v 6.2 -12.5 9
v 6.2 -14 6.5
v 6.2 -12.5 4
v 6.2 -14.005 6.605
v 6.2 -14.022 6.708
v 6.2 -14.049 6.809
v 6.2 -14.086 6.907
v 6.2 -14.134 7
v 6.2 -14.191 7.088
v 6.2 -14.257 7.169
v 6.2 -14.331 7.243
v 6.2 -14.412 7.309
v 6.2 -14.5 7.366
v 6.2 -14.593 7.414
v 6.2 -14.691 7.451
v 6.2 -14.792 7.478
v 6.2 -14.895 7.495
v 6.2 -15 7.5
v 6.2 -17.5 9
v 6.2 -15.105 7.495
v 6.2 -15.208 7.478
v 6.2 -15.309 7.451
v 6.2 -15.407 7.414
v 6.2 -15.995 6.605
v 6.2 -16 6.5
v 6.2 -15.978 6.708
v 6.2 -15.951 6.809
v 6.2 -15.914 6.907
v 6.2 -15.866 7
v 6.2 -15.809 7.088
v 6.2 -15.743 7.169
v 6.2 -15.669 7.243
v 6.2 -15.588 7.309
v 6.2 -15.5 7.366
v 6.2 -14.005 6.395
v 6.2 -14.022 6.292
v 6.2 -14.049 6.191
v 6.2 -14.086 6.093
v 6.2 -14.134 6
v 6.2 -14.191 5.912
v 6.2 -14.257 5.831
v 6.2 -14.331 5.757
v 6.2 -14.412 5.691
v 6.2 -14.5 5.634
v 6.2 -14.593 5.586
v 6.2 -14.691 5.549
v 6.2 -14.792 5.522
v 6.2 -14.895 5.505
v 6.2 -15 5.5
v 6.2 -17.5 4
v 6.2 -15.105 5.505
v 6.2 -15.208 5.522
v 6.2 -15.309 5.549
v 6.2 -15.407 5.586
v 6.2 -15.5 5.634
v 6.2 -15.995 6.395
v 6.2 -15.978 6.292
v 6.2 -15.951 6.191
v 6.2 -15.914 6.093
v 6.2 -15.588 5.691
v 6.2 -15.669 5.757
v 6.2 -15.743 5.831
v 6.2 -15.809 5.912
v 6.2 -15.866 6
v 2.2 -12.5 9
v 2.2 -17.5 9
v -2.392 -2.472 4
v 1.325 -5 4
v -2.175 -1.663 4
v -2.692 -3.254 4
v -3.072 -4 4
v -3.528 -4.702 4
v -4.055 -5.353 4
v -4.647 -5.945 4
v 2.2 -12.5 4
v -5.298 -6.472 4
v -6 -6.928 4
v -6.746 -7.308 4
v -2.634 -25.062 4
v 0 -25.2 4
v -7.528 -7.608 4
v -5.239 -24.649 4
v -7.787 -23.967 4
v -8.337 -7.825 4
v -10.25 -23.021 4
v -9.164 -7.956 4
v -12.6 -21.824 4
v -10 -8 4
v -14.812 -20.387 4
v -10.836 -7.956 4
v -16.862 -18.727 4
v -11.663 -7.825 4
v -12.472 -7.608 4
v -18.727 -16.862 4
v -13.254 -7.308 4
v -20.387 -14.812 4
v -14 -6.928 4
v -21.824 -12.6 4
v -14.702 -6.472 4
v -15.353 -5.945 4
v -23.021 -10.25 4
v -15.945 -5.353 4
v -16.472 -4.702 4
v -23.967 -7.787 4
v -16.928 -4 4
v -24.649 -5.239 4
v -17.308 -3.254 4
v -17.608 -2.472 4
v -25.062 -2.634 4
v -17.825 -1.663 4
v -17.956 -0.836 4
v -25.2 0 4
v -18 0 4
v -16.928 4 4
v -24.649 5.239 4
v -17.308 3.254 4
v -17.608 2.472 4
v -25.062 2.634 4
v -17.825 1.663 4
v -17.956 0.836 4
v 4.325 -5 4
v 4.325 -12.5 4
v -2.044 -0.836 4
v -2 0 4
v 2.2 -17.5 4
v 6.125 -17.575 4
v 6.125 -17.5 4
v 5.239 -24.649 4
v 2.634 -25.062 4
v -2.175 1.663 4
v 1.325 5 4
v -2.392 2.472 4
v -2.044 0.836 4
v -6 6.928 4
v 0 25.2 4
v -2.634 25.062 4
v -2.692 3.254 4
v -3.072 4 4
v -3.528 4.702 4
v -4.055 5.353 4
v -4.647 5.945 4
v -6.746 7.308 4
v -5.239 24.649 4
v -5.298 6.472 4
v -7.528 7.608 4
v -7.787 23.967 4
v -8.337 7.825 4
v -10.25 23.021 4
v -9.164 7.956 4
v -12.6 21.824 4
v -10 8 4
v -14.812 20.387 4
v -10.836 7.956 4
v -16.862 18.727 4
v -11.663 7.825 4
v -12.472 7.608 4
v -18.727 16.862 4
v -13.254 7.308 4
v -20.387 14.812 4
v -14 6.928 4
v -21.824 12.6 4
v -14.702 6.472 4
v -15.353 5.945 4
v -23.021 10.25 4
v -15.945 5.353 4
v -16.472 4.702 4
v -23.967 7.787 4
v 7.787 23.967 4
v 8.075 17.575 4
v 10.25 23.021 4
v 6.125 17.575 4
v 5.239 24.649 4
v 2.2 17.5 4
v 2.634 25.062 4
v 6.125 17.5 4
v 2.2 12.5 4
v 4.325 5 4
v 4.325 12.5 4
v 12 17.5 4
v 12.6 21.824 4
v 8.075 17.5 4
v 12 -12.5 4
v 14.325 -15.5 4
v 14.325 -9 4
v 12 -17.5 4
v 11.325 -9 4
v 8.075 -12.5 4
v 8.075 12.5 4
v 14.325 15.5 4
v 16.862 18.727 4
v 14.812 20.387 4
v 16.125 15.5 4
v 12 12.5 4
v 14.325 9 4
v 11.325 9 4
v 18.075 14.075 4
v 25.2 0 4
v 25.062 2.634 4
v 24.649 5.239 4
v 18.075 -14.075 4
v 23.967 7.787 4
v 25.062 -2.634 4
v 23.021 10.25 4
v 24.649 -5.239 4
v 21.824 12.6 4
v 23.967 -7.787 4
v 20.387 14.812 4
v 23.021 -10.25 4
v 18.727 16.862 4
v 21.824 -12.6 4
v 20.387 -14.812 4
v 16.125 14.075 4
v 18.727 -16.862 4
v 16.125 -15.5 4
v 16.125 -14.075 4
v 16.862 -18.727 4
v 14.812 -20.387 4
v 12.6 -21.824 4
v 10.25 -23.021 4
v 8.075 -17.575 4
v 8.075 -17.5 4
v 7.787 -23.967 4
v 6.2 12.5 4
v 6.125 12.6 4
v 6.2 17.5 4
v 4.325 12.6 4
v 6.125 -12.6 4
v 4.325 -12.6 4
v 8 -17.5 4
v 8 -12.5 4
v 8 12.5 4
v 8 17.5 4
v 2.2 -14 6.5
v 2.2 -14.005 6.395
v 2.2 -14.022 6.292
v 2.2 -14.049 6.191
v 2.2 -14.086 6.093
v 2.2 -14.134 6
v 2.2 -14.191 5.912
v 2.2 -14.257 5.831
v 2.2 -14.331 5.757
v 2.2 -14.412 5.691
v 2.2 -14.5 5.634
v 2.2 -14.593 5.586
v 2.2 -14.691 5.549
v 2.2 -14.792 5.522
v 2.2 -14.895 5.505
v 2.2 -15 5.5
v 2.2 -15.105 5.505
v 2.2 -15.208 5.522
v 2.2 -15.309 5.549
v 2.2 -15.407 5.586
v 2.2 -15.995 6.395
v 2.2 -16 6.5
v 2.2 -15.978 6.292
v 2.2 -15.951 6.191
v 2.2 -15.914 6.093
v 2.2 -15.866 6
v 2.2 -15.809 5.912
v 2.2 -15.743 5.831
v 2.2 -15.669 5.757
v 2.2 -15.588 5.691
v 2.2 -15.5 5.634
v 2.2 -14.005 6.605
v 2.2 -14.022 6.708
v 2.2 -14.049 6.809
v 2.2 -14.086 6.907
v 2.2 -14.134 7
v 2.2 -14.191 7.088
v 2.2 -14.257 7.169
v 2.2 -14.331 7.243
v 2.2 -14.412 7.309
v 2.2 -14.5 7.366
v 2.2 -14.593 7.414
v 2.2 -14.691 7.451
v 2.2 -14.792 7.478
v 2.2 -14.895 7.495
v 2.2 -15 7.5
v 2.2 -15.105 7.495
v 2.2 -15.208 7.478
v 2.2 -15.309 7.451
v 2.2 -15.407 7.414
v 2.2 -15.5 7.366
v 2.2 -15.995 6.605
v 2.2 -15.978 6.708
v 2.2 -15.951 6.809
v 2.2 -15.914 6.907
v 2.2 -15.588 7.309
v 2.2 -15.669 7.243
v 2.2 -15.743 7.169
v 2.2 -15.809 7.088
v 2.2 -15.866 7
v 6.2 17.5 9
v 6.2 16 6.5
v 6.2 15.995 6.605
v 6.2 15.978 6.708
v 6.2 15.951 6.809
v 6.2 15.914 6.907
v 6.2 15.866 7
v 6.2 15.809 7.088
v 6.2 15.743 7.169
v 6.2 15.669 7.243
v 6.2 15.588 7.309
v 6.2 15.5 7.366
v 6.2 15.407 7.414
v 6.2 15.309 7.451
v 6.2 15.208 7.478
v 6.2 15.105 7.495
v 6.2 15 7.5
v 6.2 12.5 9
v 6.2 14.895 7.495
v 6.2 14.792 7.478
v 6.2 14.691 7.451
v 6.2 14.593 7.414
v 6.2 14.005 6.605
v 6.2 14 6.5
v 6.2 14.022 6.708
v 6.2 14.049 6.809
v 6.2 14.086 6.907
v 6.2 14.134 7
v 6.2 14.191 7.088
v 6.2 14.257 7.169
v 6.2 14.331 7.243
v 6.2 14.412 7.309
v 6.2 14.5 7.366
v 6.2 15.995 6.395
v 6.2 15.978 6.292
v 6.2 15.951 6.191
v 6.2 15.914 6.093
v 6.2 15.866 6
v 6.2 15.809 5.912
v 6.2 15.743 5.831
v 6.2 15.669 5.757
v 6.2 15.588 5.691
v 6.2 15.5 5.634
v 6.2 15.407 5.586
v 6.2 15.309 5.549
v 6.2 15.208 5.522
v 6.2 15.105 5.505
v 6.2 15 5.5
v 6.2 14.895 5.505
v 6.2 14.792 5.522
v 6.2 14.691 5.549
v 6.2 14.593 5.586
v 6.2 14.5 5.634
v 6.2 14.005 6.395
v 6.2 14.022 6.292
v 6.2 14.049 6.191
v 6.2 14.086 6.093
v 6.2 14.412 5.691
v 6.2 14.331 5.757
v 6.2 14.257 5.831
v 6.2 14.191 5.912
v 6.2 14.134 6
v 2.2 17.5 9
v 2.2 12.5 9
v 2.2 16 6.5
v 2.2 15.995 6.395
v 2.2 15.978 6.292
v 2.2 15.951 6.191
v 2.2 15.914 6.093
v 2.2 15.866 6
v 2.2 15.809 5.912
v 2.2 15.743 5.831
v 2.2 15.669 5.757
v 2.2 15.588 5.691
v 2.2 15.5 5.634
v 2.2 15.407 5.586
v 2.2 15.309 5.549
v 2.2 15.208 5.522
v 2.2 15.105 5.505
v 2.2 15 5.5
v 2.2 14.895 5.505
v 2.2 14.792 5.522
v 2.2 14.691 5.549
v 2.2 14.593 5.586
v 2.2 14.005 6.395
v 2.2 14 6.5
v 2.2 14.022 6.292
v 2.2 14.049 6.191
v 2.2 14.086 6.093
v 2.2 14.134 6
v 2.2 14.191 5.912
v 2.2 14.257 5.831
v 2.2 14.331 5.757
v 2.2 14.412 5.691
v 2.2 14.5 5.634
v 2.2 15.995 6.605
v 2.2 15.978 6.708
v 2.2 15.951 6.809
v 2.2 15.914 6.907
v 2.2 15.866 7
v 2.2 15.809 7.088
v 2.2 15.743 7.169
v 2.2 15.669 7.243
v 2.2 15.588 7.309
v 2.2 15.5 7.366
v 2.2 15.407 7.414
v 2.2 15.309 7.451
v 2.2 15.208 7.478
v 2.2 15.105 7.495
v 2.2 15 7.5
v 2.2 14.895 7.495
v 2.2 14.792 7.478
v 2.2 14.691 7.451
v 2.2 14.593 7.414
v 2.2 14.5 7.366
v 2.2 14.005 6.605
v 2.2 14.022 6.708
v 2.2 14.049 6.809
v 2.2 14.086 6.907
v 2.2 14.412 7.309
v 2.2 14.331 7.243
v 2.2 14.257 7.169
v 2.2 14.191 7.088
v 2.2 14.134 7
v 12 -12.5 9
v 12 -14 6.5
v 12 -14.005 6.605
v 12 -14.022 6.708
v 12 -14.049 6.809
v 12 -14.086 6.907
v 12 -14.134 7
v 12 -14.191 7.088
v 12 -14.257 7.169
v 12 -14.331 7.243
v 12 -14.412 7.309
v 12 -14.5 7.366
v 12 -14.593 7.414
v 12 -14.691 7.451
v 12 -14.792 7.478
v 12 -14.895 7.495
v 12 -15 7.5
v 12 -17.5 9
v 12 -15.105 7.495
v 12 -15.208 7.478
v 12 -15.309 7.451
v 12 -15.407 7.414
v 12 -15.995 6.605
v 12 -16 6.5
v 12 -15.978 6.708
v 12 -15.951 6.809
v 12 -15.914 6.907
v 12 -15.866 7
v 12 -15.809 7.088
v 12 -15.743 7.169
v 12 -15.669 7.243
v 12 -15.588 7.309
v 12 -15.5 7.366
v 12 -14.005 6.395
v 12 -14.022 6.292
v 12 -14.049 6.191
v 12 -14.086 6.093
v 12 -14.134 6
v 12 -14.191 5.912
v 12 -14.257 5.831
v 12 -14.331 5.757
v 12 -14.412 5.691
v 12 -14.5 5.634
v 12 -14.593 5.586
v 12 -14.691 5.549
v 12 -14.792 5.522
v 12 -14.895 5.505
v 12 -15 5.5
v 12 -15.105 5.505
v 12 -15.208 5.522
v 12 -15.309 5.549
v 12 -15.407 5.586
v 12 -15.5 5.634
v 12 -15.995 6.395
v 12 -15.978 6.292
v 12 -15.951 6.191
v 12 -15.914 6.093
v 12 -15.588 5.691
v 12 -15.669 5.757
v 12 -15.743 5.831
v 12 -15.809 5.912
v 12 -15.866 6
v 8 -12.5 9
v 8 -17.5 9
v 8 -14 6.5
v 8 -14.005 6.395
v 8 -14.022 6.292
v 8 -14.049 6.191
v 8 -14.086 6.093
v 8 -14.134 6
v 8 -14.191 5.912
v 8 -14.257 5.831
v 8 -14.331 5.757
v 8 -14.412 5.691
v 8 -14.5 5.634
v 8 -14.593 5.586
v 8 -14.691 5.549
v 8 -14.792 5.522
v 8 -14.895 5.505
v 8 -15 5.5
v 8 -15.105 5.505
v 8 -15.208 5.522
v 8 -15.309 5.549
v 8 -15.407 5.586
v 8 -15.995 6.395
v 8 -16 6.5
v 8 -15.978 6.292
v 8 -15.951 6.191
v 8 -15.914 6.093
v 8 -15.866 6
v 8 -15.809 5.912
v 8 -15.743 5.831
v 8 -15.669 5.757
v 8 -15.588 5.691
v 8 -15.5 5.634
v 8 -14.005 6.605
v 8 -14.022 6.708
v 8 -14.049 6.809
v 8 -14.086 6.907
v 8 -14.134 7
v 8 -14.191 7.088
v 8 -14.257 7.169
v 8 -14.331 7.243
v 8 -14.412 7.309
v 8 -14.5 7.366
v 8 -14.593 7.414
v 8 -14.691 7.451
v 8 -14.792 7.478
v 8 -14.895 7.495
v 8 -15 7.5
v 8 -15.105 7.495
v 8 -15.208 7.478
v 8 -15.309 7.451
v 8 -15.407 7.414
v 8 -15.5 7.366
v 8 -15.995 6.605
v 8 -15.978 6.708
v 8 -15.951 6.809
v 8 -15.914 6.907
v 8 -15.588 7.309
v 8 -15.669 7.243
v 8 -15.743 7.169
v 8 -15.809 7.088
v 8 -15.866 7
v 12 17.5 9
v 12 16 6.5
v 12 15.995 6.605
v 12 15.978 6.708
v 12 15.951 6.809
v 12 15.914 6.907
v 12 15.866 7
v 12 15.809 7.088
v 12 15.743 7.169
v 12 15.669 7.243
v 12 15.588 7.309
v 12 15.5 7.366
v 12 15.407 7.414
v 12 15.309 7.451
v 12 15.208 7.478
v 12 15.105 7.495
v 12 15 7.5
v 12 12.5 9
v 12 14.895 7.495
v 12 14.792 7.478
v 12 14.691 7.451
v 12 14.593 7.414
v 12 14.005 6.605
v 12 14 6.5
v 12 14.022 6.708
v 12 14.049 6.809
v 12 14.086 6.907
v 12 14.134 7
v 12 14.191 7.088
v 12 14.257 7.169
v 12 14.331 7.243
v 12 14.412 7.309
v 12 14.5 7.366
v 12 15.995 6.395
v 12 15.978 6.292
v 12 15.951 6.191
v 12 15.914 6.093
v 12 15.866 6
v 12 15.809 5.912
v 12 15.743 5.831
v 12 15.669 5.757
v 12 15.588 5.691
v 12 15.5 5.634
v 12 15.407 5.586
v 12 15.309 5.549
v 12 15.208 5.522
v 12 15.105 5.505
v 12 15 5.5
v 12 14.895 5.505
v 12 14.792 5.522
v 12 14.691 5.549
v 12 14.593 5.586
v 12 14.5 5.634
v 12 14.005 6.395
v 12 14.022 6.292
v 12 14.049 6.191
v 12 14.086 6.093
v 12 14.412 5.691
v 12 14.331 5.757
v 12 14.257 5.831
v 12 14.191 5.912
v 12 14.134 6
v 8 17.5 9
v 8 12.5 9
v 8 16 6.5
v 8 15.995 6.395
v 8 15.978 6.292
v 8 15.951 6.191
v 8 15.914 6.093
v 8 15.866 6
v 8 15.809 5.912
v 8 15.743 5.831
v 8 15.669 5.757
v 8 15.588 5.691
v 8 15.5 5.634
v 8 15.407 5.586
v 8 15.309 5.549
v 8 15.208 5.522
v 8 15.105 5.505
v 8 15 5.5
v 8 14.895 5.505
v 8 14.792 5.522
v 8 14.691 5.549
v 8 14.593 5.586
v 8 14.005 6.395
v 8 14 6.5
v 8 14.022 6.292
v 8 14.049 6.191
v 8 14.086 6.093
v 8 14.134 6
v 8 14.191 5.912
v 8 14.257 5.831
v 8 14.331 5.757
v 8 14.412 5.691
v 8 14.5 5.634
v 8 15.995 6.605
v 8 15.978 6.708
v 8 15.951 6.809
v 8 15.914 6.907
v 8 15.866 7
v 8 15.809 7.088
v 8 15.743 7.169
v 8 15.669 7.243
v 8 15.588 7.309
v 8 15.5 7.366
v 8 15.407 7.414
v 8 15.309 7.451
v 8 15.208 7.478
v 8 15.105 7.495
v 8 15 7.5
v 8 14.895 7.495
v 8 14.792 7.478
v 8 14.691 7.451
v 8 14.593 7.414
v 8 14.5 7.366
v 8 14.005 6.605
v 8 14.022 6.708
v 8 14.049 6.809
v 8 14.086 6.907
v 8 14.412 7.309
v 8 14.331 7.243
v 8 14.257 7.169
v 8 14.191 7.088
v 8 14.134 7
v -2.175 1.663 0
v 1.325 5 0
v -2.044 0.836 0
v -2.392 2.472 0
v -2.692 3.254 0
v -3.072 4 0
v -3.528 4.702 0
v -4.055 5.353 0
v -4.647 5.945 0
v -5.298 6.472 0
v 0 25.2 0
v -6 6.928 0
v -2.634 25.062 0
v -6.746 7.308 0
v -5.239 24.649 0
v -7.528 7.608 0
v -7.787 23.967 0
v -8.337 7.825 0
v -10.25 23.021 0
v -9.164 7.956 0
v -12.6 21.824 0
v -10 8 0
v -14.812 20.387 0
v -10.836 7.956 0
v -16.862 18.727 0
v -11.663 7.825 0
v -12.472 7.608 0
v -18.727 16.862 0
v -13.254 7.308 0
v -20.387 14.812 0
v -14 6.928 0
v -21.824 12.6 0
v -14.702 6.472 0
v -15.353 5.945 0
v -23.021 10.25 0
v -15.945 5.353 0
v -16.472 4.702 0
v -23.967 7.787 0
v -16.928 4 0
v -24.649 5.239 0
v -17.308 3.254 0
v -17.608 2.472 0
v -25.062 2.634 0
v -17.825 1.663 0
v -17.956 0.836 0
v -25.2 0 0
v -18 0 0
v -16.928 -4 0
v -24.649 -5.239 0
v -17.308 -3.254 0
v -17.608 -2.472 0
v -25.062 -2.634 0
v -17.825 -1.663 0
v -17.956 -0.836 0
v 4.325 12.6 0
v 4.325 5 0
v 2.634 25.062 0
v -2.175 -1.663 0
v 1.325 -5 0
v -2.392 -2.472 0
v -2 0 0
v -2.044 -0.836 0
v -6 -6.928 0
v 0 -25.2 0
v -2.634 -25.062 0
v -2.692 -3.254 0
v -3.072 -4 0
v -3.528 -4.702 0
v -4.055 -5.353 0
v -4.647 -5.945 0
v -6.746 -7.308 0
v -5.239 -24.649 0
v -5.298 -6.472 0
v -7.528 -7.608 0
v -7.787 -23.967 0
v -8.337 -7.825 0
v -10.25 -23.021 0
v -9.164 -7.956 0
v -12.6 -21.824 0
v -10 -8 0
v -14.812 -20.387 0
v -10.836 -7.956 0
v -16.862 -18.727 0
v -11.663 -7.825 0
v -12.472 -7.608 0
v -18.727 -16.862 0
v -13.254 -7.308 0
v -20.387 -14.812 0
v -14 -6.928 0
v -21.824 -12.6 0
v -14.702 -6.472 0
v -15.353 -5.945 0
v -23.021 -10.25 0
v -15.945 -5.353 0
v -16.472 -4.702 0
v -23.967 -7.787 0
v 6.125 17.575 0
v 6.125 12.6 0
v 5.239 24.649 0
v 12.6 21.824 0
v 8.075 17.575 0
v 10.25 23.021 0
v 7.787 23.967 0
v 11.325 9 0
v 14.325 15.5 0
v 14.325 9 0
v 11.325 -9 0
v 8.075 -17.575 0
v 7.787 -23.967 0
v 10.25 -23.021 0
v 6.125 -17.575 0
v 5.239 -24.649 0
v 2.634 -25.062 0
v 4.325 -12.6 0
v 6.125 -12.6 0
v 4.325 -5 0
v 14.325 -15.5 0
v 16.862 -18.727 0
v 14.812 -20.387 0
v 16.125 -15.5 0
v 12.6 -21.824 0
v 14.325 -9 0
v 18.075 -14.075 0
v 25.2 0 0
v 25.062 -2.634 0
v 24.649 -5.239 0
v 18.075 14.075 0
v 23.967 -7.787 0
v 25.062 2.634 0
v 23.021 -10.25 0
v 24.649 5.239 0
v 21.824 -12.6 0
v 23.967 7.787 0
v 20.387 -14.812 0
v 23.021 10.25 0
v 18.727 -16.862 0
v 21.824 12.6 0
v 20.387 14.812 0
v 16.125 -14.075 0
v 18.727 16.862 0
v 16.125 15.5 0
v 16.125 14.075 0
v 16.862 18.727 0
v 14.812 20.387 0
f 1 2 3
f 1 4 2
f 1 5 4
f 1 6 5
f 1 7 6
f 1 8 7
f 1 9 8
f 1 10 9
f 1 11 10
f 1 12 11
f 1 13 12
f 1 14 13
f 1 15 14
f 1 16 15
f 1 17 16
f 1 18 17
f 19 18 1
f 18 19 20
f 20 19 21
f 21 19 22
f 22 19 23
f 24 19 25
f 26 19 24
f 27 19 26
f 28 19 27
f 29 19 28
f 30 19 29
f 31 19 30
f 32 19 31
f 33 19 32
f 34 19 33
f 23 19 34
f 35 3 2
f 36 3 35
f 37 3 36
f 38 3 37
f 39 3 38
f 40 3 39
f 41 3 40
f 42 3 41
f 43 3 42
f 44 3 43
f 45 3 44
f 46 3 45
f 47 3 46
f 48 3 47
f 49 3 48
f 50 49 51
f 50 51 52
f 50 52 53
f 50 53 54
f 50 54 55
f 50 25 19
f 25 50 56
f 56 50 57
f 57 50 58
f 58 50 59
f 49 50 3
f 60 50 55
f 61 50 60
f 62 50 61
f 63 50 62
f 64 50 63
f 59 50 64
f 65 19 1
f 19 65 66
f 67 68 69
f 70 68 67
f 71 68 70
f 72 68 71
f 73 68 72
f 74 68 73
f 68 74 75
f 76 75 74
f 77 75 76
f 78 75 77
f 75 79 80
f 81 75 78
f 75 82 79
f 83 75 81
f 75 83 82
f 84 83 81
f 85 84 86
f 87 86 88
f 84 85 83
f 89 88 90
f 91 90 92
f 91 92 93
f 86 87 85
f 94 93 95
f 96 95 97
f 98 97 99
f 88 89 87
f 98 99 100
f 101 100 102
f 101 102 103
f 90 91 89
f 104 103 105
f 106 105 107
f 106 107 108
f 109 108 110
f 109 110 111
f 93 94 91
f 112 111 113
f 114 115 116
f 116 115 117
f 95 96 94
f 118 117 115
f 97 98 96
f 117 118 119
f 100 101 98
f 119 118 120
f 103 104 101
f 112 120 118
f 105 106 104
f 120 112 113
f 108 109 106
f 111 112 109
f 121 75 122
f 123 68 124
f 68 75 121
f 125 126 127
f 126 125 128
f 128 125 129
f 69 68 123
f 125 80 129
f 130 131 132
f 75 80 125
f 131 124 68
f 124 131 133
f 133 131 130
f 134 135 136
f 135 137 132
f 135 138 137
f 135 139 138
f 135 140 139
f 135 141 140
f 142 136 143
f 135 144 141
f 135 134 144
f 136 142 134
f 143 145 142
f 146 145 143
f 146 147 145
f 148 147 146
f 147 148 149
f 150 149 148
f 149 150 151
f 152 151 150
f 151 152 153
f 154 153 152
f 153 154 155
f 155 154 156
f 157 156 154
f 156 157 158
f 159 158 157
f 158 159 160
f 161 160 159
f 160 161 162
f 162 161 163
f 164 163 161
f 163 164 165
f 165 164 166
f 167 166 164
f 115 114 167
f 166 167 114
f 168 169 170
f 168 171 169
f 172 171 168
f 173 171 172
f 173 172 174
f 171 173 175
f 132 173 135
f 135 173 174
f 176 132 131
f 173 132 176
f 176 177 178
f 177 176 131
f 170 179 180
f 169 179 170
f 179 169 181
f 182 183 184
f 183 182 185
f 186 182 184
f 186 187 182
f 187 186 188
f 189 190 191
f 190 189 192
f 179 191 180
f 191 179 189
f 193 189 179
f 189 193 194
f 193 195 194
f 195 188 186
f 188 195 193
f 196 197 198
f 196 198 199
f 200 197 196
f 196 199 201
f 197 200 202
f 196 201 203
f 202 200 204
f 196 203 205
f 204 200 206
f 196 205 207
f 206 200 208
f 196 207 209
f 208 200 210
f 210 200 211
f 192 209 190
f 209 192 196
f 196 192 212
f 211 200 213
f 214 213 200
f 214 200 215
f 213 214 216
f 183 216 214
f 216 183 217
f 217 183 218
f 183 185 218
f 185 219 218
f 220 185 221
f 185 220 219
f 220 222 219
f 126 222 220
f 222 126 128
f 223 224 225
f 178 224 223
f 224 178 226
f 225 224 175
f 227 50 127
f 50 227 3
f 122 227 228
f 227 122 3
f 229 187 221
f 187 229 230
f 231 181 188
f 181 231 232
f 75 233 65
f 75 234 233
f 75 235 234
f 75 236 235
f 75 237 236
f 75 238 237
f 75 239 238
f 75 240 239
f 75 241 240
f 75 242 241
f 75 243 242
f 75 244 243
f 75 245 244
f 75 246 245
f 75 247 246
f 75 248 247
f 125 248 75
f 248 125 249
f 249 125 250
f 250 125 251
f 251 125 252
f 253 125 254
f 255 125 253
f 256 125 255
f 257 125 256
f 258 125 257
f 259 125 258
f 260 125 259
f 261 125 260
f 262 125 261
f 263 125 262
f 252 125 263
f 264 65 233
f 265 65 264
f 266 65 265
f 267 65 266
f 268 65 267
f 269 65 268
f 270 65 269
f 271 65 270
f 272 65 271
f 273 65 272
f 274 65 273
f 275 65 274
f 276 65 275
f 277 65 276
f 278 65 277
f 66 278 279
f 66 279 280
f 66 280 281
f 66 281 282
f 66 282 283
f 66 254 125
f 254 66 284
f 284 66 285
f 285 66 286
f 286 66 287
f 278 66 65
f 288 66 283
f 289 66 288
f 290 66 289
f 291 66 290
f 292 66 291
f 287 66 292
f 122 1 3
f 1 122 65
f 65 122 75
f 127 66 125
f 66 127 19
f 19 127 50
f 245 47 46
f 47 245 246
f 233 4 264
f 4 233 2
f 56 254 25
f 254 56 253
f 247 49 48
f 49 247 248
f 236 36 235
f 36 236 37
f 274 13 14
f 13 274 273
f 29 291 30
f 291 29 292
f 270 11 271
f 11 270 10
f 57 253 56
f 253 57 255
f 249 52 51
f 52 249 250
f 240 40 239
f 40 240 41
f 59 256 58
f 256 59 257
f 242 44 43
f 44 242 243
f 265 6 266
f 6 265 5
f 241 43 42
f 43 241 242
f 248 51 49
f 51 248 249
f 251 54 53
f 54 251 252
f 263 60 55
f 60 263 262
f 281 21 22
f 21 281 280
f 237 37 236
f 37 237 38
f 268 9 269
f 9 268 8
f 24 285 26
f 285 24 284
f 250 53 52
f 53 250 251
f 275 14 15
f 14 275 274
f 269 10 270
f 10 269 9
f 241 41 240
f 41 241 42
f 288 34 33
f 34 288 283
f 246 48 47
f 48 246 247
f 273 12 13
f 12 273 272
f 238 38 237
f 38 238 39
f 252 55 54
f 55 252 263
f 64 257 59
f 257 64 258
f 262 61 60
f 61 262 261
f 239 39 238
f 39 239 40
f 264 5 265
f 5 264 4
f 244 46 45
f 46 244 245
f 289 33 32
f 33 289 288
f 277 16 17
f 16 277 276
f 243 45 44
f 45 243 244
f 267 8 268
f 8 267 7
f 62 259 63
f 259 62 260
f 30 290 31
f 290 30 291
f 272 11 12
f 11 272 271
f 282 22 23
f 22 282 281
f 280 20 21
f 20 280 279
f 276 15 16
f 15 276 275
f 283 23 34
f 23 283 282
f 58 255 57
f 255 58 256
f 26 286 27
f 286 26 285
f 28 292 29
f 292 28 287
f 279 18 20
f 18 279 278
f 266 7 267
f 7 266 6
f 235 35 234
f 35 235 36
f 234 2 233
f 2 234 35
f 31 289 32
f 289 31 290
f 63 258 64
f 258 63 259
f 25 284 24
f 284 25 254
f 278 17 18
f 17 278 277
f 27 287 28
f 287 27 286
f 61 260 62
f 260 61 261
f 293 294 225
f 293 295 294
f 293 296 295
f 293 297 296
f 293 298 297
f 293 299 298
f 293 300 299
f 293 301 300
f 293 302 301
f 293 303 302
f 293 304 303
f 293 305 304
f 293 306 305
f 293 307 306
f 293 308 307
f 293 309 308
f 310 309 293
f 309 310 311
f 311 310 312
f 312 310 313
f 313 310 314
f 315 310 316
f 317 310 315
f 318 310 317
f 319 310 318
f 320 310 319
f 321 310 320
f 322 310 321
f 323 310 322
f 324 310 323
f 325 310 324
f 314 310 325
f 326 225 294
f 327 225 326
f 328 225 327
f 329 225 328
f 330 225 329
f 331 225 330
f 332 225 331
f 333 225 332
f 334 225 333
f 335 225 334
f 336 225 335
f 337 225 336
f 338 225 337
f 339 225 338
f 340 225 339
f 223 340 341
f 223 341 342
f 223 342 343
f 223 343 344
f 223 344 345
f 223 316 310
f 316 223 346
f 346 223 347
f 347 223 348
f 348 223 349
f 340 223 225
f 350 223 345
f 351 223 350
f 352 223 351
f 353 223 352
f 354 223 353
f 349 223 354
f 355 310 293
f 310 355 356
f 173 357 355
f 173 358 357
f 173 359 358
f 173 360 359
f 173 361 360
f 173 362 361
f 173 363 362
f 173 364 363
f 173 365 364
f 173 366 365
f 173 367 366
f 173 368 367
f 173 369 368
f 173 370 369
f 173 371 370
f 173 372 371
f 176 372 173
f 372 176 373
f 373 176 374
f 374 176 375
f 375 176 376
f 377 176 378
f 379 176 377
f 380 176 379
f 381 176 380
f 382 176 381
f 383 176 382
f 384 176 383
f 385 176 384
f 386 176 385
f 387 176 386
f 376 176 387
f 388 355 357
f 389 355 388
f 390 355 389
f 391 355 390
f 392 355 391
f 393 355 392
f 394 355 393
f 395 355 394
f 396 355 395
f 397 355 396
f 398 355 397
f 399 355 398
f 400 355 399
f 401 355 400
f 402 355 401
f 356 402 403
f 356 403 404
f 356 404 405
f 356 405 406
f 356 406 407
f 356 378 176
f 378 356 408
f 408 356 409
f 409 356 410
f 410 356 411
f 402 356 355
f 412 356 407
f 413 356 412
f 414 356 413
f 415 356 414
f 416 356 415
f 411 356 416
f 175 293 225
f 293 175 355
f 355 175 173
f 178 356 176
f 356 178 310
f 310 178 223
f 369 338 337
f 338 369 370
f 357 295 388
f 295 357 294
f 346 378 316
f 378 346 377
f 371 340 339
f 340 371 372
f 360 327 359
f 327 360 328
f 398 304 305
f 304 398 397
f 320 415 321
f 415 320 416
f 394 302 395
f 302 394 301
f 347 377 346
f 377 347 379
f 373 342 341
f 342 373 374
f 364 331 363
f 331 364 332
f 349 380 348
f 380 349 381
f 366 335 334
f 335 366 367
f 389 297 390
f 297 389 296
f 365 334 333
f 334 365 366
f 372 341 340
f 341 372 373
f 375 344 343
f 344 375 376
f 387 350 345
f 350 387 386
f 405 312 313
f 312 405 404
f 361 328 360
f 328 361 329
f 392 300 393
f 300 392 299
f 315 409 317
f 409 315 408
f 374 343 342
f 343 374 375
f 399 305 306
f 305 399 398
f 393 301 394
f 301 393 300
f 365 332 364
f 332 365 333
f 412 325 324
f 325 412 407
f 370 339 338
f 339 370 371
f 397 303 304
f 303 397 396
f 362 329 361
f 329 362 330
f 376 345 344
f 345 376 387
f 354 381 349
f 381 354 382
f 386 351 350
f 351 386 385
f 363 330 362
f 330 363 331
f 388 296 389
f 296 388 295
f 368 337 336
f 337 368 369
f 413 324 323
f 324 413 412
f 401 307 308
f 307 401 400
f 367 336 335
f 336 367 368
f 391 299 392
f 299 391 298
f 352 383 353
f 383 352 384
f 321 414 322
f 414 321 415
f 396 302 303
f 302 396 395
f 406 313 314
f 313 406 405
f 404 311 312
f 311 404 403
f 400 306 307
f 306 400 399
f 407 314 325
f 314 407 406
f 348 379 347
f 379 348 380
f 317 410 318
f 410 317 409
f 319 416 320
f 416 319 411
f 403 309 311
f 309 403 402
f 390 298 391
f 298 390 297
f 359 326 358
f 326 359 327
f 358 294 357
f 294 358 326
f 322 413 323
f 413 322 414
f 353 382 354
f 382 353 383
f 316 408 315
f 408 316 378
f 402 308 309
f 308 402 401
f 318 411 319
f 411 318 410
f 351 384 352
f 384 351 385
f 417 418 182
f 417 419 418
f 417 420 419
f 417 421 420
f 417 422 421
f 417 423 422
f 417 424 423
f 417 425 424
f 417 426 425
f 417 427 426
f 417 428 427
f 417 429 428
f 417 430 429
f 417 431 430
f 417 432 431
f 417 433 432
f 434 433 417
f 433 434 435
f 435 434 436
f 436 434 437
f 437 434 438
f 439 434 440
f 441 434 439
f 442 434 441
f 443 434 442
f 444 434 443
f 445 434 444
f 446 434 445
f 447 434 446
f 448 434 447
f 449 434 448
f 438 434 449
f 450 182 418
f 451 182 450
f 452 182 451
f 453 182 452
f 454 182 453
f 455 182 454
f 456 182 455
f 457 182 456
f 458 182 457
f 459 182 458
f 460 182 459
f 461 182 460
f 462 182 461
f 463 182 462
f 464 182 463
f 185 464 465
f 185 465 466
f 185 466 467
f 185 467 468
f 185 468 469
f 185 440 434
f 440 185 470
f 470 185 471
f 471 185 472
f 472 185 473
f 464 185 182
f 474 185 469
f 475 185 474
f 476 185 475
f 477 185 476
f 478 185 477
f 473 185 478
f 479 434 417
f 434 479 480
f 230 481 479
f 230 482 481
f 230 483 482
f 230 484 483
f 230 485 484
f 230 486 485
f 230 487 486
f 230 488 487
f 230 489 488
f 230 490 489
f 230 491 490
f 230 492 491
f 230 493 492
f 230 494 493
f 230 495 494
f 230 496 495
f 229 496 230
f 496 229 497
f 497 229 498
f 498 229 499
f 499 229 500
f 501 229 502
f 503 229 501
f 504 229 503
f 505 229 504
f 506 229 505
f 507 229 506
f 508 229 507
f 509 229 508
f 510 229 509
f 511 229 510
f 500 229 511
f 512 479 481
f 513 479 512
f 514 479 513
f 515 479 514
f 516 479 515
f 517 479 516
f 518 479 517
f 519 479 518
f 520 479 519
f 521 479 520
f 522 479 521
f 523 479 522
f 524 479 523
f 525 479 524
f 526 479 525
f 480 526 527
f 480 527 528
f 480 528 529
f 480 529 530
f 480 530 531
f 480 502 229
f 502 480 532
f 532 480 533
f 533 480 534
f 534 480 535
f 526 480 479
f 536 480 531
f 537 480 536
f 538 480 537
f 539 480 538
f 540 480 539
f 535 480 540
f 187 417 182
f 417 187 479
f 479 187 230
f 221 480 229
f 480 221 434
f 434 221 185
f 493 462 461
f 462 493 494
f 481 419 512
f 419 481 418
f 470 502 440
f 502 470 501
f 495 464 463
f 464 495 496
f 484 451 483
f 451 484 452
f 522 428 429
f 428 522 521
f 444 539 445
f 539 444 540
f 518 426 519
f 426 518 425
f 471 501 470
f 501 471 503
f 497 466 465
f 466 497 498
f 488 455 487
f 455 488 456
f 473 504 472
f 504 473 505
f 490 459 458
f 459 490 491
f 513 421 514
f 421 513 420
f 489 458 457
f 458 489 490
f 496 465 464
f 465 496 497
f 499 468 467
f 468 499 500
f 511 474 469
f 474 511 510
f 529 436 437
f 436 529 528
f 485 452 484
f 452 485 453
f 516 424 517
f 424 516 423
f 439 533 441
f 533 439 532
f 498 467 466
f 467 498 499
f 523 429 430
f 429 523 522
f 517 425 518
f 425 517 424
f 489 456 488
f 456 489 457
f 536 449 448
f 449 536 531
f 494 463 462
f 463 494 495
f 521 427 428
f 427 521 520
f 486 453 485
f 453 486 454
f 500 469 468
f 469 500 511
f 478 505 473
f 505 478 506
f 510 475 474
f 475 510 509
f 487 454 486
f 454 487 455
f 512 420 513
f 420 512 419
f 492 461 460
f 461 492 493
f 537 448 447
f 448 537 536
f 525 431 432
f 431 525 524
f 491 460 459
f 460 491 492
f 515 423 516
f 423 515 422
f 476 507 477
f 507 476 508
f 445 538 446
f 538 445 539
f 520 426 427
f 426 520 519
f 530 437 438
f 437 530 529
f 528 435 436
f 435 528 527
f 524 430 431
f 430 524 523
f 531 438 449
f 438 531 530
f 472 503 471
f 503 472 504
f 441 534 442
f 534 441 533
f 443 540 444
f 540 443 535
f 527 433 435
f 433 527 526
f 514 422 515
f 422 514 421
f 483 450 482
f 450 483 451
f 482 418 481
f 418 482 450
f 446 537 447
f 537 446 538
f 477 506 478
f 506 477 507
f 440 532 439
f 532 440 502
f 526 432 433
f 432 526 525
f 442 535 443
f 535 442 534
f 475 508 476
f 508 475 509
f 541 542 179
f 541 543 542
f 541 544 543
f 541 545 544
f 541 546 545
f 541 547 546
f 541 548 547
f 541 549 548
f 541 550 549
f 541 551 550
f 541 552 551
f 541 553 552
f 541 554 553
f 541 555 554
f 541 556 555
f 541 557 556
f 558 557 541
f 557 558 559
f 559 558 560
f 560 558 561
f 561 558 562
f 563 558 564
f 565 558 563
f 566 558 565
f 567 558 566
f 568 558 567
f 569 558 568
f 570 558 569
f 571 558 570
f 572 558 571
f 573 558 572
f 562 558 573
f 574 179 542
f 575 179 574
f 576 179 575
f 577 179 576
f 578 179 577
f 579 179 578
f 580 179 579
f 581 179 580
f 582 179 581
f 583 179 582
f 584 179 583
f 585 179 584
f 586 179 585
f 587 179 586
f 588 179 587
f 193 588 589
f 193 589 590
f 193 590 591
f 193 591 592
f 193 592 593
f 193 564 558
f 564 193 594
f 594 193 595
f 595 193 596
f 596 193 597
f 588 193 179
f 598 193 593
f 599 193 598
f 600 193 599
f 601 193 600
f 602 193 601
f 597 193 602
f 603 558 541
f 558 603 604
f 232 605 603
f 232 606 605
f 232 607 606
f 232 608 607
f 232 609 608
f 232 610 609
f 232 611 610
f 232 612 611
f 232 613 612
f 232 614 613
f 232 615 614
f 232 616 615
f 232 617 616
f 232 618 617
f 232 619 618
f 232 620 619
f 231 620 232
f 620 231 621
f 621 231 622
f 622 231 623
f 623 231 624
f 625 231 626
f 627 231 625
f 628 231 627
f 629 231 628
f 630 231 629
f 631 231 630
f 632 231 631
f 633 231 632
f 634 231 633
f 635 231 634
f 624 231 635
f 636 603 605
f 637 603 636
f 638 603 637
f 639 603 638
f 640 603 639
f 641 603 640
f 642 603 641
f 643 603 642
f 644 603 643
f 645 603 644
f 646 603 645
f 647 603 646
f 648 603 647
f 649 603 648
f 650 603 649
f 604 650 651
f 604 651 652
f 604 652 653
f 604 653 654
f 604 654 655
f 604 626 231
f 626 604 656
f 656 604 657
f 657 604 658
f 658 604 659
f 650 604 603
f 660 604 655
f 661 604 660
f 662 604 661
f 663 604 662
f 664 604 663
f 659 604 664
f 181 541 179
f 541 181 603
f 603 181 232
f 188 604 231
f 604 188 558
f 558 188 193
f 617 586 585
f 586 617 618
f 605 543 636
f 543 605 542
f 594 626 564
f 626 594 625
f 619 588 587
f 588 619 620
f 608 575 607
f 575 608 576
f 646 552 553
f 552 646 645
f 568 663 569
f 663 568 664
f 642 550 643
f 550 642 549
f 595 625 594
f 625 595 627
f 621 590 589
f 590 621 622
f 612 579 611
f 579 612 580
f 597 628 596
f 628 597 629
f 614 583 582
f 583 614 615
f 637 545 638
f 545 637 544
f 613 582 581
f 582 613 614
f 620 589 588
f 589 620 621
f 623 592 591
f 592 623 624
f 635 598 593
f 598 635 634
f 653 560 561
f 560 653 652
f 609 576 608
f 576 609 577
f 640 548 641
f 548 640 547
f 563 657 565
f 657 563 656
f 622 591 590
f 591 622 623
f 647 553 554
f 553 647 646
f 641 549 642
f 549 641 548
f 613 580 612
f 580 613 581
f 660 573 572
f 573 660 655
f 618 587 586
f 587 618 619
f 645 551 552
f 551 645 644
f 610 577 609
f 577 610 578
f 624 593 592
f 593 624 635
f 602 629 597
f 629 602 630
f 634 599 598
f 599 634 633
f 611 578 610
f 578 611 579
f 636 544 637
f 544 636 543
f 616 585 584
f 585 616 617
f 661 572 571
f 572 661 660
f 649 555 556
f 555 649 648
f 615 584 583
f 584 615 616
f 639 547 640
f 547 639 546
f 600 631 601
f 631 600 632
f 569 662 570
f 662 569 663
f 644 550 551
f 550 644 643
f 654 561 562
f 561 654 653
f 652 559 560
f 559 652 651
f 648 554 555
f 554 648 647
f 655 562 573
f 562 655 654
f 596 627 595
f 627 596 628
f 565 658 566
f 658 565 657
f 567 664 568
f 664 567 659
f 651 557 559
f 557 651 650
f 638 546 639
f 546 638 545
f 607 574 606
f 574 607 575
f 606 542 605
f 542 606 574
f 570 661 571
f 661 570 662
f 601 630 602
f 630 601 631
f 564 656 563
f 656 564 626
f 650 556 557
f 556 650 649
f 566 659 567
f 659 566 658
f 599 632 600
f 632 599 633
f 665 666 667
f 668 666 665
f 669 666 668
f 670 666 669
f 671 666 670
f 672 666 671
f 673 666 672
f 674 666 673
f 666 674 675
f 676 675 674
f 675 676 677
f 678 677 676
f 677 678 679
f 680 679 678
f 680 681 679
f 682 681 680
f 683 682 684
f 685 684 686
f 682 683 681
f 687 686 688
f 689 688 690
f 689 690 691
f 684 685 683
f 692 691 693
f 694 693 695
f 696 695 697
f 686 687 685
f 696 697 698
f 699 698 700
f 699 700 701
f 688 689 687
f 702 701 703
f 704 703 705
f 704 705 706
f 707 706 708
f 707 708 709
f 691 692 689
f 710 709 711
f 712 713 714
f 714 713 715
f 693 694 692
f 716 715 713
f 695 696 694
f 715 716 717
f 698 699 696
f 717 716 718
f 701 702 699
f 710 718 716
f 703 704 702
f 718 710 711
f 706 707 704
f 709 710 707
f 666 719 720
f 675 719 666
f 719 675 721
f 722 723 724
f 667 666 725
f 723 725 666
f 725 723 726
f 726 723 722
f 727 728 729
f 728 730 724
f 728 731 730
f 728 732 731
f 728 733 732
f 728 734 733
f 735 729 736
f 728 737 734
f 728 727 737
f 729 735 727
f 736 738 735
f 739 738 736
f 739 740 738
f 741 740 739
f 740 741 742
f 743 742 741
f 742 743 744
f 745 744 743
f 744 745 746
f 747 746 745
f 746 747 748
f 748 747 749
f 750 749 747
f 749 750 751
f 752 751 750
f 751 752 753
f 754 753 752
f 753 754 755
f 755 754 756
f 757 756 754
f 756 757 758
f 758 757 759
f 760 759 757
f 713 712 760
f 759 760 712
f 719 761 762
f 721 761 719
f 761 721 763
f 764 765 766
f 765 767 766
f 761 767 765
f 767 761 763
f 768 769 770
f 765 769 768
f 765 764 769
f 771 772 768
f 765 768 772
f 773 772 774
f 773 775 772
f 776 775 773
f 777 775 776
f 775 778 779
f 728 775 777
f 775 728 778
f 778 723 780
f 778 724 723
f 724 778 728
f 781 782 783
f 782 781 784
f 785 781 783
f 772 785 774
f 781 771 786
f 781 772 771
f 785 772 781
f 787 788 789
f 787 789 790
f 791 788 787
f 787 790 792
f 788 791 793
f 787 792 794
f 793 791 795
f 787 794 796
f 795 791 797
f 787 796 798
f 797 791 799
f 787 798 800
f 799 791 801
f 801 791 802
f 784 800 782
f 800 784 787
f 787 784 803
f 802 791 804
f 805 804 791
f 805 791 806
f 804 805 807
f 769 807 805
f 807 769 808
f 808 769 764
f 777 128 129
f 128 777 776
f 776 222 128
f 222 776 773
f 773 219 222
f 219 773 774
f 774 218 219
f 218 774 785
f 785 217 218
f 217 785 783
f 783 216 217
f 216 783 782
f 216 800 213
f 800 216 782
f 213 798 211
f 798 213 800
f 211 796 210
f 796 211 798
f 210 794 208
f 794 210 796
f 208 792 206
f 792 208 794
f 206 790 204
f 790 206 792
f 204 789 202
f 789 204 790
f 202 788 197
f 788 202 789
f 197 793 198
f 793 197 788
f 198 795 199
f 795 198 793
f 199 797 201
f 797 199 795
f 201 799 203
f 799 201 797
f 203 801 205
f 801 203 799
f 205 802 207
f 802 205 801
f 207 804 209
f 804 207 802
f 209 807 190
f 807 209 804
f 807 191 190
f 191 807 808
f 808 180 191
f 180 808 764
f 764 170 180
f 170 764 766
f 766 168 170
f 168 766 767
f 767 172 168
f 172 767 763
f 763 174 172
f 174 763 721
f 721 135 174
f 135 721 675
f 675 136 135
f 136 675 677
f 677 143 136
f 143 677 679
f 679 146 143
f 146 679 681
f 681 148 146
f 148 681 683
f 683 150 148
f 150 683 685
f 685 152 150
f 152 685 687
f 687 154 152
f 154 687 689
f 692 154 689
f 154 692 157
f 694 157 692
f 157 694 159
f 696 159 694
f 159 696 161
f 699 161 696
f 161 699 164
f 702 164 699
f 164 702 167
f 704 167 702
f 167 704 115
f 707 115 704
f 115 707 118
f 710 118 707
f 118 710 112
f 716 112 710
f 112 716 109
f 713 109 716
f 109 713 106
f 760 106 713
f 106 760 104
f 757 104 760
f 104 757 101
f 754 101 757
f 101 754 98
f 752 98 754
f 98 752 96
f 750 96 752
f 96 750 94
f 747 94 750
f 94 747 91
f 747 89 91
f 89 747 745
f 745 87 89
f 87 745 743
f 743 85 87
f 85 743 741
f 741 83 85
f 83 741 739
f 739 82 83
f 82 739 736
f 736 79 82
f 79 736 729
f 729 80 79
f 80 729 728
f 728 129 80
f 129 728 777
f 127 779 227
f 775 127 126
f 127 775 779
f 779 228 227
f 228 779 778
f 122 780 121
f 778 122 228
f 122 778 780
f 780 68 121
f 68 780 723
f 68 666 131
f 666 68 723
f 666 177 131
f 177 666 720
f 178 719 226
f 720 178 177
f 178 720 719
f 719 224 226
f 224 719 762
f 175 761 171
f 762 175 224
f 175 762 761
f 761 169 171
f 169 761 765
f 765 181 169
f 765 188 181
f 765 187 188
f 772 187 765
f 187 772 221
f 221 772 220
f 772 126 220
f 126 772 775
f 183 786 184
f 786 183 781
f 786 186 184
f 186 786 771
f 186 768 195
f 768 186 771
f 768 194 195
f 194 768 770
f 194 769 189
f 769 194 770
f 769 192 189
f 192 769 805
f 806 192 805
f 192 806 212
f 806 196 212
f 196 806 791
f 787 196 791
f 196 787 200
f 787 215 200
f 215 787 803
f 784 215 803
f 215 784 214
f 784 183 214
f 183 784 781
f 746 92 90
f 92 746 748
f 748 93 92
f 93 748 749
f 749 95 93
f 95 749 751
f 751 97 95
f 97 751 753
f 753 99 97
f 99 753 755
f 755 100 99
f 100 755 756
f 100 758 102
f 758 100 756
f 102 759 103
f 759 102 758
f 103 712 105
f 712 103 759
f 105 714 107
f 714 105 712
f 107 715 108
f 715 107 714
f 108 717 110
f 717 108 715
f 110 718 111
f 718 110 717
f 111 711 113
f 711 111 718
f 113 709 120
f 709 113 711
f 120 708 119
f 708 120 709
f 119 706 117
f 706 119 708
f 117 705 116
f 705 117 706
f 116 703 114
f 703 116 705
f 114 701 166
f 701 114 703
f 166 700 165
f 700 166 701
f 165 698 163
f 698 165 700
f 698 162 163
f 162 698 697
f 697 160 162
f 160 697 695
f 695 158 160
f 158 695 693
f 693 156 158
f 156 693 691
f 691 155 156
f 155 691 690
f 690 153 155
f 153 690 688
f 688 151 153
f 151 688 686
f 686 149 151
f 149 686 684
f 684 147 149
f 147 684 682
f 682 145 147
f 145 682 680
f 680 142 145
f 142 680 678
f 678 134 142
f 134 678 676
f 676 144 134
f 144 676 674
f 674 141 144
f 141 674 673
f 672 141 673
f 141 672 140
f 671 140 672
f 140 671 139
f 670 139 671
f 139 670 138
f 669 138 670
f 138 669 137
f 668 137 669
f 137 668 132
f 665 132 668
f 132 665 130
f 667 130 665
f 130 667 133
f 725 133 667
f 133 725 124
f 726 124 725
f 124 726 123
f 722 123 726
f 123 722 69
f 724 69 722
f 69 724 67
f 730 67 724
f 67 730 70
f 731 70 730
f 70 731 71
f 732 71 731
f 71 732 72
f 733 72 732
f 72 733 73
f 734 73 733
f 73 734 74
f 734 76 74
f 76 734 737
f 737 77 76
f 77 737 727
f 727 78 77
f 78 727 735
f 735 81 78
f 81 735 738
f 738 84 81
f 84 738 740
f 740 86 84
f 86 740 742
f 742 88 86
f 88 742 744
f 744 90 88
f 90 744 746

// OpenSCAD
// file: ../include/tube.scad
// Simple tube
// r is the outer radius
// w is the width of the tube wall
module tube(h, r, w) {
  difference() {
    cylinder(h = h, r = r);
    translate([0, 0, - 1])
      cylinder(h = h + 2, r = r - w);
  }
}
// file: ../vitamin/pcb.scad
// Modules and constants for mocking up printed circuit boards

// Conventions:
// -- the long side is x, narrow side is y
// -- the bottom of the board is at z=0

// Header base
hdr_base_x = 2.5;
hdr_base_y = 2.5;
hdr_base_z = 2.5;

// Header pin
hdr_pin_x = 0.7;
hdr_pin_y = 0.7;
hdr_pin_z = 11.75;

// Common components, spec: [x size, y size, z size, color]
micro_usb = [5.0, 7.5, 2.5, "silver"];
jst2 = [6.0, 8.0, 5.6, "black"];
hdmi = [7.25, 11.25, 3.3, "Silver"];
sd_card_holder = [12.0, 11.5, 1.3, "Silver"];

// Printed circuit board with rounded corners
module pcb(x, y, board_h = 1.5, r = 2.5) {
  x_pos = x / 2 - r;
  y_pos = y / 2 - r;

  hull() for (i = [- x_pos, x_pos], j = [- y_pos, y_pos]) {
    translate([i, j, 0]) cylinder(r = r, h = board_h);
  }
}

// Hole in the pcb
module pcb_hole(x, y, r, board_h = 1.5) {
  translate([x, y, - 0.1]) cylinder(h = board_h + 0.2, r = r);
}

// Component that sits on top of the pcb
// Future: support bottom mounted components
module pcb_component(spec, x, y, yaw = 0.0, board_h = 1.5) {
  color(spec[3])
    translate([x, y, board_h + spec[2] / 2])
      rotate([0, 0, yaw])
        cube([spec.x, spec.y, spec.z], center = true);
}

// Header (base + pin)
module pcb_header(x, y, base_z, pin_z) {
  color("Black")
    translate([x, y, base_z])
      cube([hdr_base_x, hdr_base_y, hdr_base_z], center = true);
  color("Silver")
    translate([x, y, pin_z])
      cube([hdr_pin_x, hdr_pin_y, hdr_pin_z], center = true);
}
// file: ../vitamin/pi_zero.scad
include <pcb.scad>

// Options
show_pi = true;
show_gpio_header = 0;  // 0 = no headers, 1 = above, -1 = below
show_extra_header = false;  // 2x2 header for reset switch and RCA composite video

// PCB
pi_x = 65;
pi_y = 30;
pi_z = 1.6;
pi_half_z = pi_z / 2;
pi_corner_r = 3.0;

// Mount holes
pi_hole_edge = 3.5;  // Distance from edge to center of mount hole
pi_hole_d = 2.75;
pi_hole_r = pi_hole_d / 2;
pi_hole_x = pi_x / 2 - pi_hole_edge;
pi_hole_y = pi_y / 2 - pi_hole_edge;
pi_holes = [for (i = [- pi_hole_x, pi_hole_x], j = [- pi_hole_y, pi_hole_y]) [i, j]];

// Header holes
pi_header_pitch = 2.54; // 0.1in
pi_header_size = [20 * pi_header_pitch, 2 * pi_header_pitch];
pi_header_pos = [0, pi_y / 2 - pi_hole_edge]; // center=true

// Components, see pcb.scad::pcb_component()
csi_socket = [3, 17, 1.3, "Ivory"];
csi_clip = [1, 17, 1.3, "DimGray"];
activity_led = [2.3, 1, 1, "GreenYellow"];
cpu = [12, 12, 1.2, "Black"];

// Antenna
antenna_poly = [[- 6.5, - 11.4], [1.5, - 11.4], [- 1.5, - 13.5], [- 4, - 13.5], [- 6.5, - 11.4]];

// Header pin position calculators, return the center of the hole, pitch is 0.1"
function pin_pos_x(i) = - (19 * pi_header_pitch / 2) + i * pi_header_pitch;
function pin_pos_y(j) = pi_hole_y - pi_header_pitch / 2 + j * pi_header_pitch;

// Pi body and headers
module pi_zero() {
  if (show_pi) pi_zero_body();
  if (show_gpio_header) pi_headers(show_gpio_header);
}

// Just Pi body
module pi_zero_body() {
  color("#038f3f") difference() {
    pcb(pi_x, pi_y, pi_z, pi_corner_r);

    // Corner screw holes
    for (pi_hole = pi_holes) {
      pcb_hole(pi_hole.x, pi_hole.y, pi_hole_r, pi_z);
    }

    // GPIO header holes
    for (i = [0:19], j = [0, 1]) {
      pcb_hole(pin_pos_x(i), pin_pos_y(j), 0.5, pi_z);
    }

    // Extra header holes
    for (i = [18, 19], j = [- 1, - 2]) {
      pcb_hole(pin_pos_x(i), pin_pos_y(j), 0.5, pi_z);
    }
  }

  // Components
  pcb_component(cpu, - 7.1, - 2);
  pcb_component(sd_card_holder, - 24.5, 1.9, yaw = 90);
  pcb_component(hdmi, - 20.1, - 11.4, yaw = 90);  // TODO check height!
  pcb_component(micro_usb, 8.9, - 13, yaw = 90);  // Data
  pcb_component(micro_usb, 21.5, - 13, yaw = 90);  // Power
  pcb_component(activity_led, 26.5, - 8);
  pcb_component(csi_socket, 30, 0);
  pcb_component(csi_clip, 32, 0);

  // Antenna
  color("DarkGreen") translate([0, 0, 0.1]) linear_extrude(height = pi_z) polygon(antenna_poly);
}

// Pi headers
module pi_headers(direction = 1) {
  base_z = pi_half_z + direction * (pi_half_z + hdr_base_z / 2);
  pin_z = pi_half_z + direction * (pi_half_z + hdr_pin_z / 2 - 3);

  for (i = [0:19], j = [0, 1]) {
    pcb_header(pin_pos_x(i), pin_pos_y(j), base_z, pin_z);
  }

  if (show_extra_header) {
    for (i = [18, 19], j = [- 1, - 2]) {
      pcb_header(pin_pos_x(i), pin_pos_y(j), base_z, pin_z);
    }
  }
}

// Preview:
//$fn = 60;
//pi_zero();
// file: ../vitamin/blue_robotics.scad
include <../include/tube.scad>

// 2" flange dimensions
flange_h = 21.5;
flange_w = 6;

// TODO camera flange hole orientation is arbitrary, 0, 90, 180, 270 would be more useful

// Flange exterior portion
flange_ext_h = 6;
flange_ext_r = 25;
flange_ext_hole_offset = 23;  // Approximate
flange_ext_holes = [for (angle = [30, 90, 150, 210, 270, 330])
  [cos(angle) * flange_ext_hole_offset, sin(angle) * flange_ext_hole_offset]];

// Flange interior portion
flange_int_h = flange_h - flange_ext_h;
flange_int_r = flange_ext_r - flange_w;
flange_int_hole_offset = 21.5;
flange_int_holes = [for (angle = [30, 120, 210, 300])
  [cos(angle) * flange_int_hole_offset, sin(angle) * flange_int_hole_offset]];

// The pen and cam brackets are flipped upside down, so provide a set of holes that match
flange_int_holes_flipped = [for (angle = [60, 150, 240, 330])
  [cos(angle) * flange_int_hole_offset, sin(angle) * flange_int_hole_offset]];

// 2" tube dimensions
tube_h = 120;
tube_wall = 3.2;
tube_r_inside = 25.4;
tube_r_outside = tube_r_inside + tube_wall;

// Flange exterior 2d pattern
module flange_ext_2d() {
  difference() {
    circle(r = 28.5);
    circle(r = 28.5 - 9.5);

    // Six exterior holes
    for (ext_hole = flange_ext_holes) {
      translate([ext_hole.x, ext_hole.y]) circle(r = 1);
    }
  }
}

// Flange interior 2d pattern
module flange_int_2d() {
  difference() {
    circle(r = flange_ext_r);
    circle(r = flange_ext_r - flange_w);

    // Four interior holes
    for (int_hole = flange_int_holes) {
      translate([int_hole.x, int_hole.y]) circle(r = 1);
    }
  }
}

// BlueRobotics 2" flange
// Aligned so that the 2 penetrations run along the x axis
module flange() {
  // Exterior tube
  linear_extrude(height = flange_ext_h)
    flange_ext_2d();

  // Interior tube
  translate([0, 0, flange_ext_h]) linear_extrude(height = flange_int_h)
    flange_int_2d();
}

// BlueRobotics 2" tube
module two_inch_tube() {
  tube(h = tube_h, r = tube_r_outside, w = tube_wall);
}

// Switch and wires -- just the bits that stick into the tube
module switch_and_wires() {
  cylinder(h = 10, r = 4);
}

// Camera flange
module cam_flange() {
  flange();
}

// Penetration flange with the switch and wires
module pen_flange() {
  flange();

  // One of the two penetrations has a switch and wires sticking into the interior
  //translate([-cos(0) * 9, sin(0) * 9, flange_h]) switch_and_wires();
  translate([- cos(180) * 9, sin(180) * 9, flange_h]) switch_and_wires();
}

// Preview:
//$fn = 60;
//two_inch_tube();
//cam_flange();
//pen_flange();
// file: ../vitamin/adafruit.scad
include <pcb.scad>

pb_size = [36.2, 22.86];
pb_z = 1.6;
pb_hole_r = 1.25; // Measured
pb_hole_x = 36.2 / 2 - 2.5;
pb_hole_y = 17.65 / 2;
pb_holes = [for (j = [- pb_hole_y, pb_hole_y]) [pb_hole_x, j]];
pb_header_pitch = 2.54; // 0.1in
pb_header_size = [pb_header_pitch, 8 * pb_header_pitch];
pb_header_pos = [pb_size.x / 2 - 21.72, pb_size.y / 2 - 1]; // center=true

battery_d = 18.5; // Measured
battery_r = battery_d / 2;
battery_h = 69;

// Adafruit Powerboost 1000 Charger
// https://www.adafruit.com/product/2465
module power_boost() {
  color("#065daa") difference() {
    pcb(pb_size.x, pb_size.y);

    for (hole = pb_holes) {
      pcb_hole(hole.x, hole.y, pb_hole_r, pb_z);
    }

    pb_header_hole_r = 0.5;
    pb_header_hole_x_start = pb_header_pos.x - 3.5 * pb_header_pitch;
    pb_header_hole_y_end = pb_header_pos.x + 3.5 * pb_header_pitch;
    pb_header_holes = [for (j = [pb_header_hole_x_start:pb_header_pitch:pb_header_hole_y_end]) [j, pb_header_pos.y]];
    for (hole = pb_header_holes) {
      pcb_hole(hole.x, hole.y, pb_header_hole_r, pb_z);
    }
  }

  pcb_component(micro_usb, 36.2 / 2 - 2, 0);
  pcb_component(jst2, 7.5, - 8, 90);
  pcb_component([5, 5, 3.9, "black"], - 3, - 4);
}

// Adafruit Lithium Ion Cylindrical Battery - 3.7v 2200mAh
// https://www.adafruit.com/product/1781
module battery() {
  color("#02a5fe") cylinder(h = battery_h, r = battery_r);
}

// Preview:
//$fn = 60;
//power_boost();
//battery();
// file: ../part/ec_common.scad
include <../vitamin/adafruit.scad>
include <../vitamin/blue_robotics.scad>
include <../vitamin/pi_zero.scad>

// All tolerances measured for my Prusa MK3S + PLA + 0.15mm layers

// Good M2 hole radius
M2_hole_r = 1.1;

// When printed sideways it needs to be a bit smaller
M2_hole_side_print_r = 1;

// Build a structure with 2 circular ("ring") brackets connected by 2 flat trays
// The trays have tabs that slot into the cam_bracket and the pen_bracket

// Overall structure size:
structure_h = 76;
bracket_ring_h = 4;
tray_length = structure_h - 2 * bracket_ring_h;

// Bracket radius, slightly smaller than the inside of the tube
bracket_r = tube_r_inside - 0.2;

// Interior radius, slightly smaller than the inside of the flange
interior_r = flange_int_r - 0.2;

// Tray sizes
pi_tray_size = [tray_length, 34, 1.8];
pb_tray_size = [tray_length, 40, 1.8];

// How the trays are positioned in the brackets
pi_slot_position = 18;
pb_slot_position = 8;

// Adjust boards to be center=true
pi_center_offset = pi_slot_position - pi_tray_size.z / 2;
pb_center_offset = pb_slot_position - pb_tray_size.z / 2;

// Slots are slightly larger than tabs
tab_slot_tolerance = 0.15;

// The pi and pb boards also fit snugly into the brackets
board_slot_tolerance = 0.2;

// The pb_tray is attached to the pen_bracket and the cam_bracket at 2 points with M2 screws
attach = [4, 5, 5];
attach_hole_r = M2_hole_r;
attach_hole_side_print_r = M2_hole_side_print_r;
attach_cam_pos_y = 6;
attach_pen_pos_y = 15;

// Holes in pb_tray
attach_cam_holes = [[- 42, - attach_cam_pos_y], [- 42, attach_cam_pos_y]];
attach_pen_holes = [[40.5, - attach_pen_pos_y], [40.5, attach_pen_pos_y]];

// Nut positions in cam_bracket
nut_pb_cam_posns = [[2, - attach_cam_pos_y], [2, attach_cam_pos_y]];

// Tab widths
pi_cam_tab_width = 14;
pi_pen_tab_width = 28;
pb_cam_tab_width = 25;
pb_pen_tab_width = 35;

// Tab sizes
pi_cam_tab = [bracket_ring_h, pi_cam_tab_width];
pi_pen_tab = [bracket_ring_h, pi_pen_tab_width];
pb_cam_tab = [bracket_ring_h + 8, pb_cam_tab_width];
pb_pen_tab = [bracket_ring_h, pb_pen_tab_width];

// Slot sizes
pi_cam_slot = [pi_tray_size.z + tab_slot_tolerance, pi_cam_tab_width + tab_slot_tolerance];
pi_pen_slot = [pi_tray_size.z + tab_slot_tolerance, pi_pen_tab_width + tab_slot_tolerance];
pb_cam_slot = [pb_tray_size.z + tab_slot_tolerance, pb_cam_tab_width + tab_slot_tolerance];
pb_pen_slot = [pb_tray_size.z + tab_slot_tolerance, pb_pen_tab_width + tab_slot_tolerance];

// Slot positions
pi_cam_slot_pos = [pi_center_offset, 0];
pi_pen_slot_pos = [pi_center_offset, 0];
pb_cam_slot_pos = [pb_center_offset, 0];
pb_pen_slot_pos = [pb_center_offset, 0];

// PCB knockout sizes
pi_pcb_kn = [pi_z + board_slot_tolerance, 31];
pb_pcb_kn = [pb_z + board_slot_tolerance, 25.2];  // Same width as tray tab

// PCB knockout positions
pi_pcb_cam_kn_pos = [pi_cam_slot_pos.x - pi_cam_slot.x / 2 - pi_pcb_kn.x / 2, 0];
pi_pcb_pen_kn_pos = [pi_pen_slot_pos.x - pi_pen_slot.x / 2 - pi_pcb_kn.x / 2, 0];
pb_pcb_pen_kn_pos = [pb_pen_slot_pos.x - pb_pen_slot.x / 2 - pb_pcb_kn.x / 2, 0];

// Board component knockout sizes
pi_comp_kn = [3, 18];
pb_comp_kn = [3, 10];

// Board component knockout positions
pi_comp_cam_kn_pos = [pi_pcb_cam_kn_pos.x - pi_pcb_kn.x / 2 - pi_comp_kn.x / 2, 0];
pi_comp_pen_kn_pos = [pi_pcb_pen_kn_pos.x - pi_pcb_kn.x / 2 - pi_comp_kn.x / 2, 0];
pb_comp_pen_kn_pos = [pb_pcb_pen_kn_pos.x - pb_pcb_kn.x / 2 - pb_comp_kn.x / 2, 0];

// Mount the boards on the trays
pi_mount = [5.5, 0];
pb_mount = [20, 0];

// Boards sit slightly off the tray
mount_standoff = 0.3;

// The trays have nibs to hold the boards in place
pi_nib_h = pi_z + board_slot_tolerance / 2;
pb_nib_h = pb_z + board_slot_tolerance / 2;

// All assemblies are built with the camera facing down, where z=0 at the camera center point.
// The 2 trays share a common z, so that appears here.
tray_center_z = tray_length / 2 + flange_h + bracket_ring_h;

// Battery position
battery_pos = [- 9.5, 0, 9];
// file: ../part/pen_bracket.scad
include <ec_common.scad>

include <../vitamin/adafruit.scad>

// Bracket for the penetration flange
module pen_bracket() {
  linear_extrude(height = bracket_ring_h)
    difference() {
      circle(r = bracket_r);

      // Slot for the pi tray
      translate(pi_pen_slot_pos)
        square(pi_pen_slot, center = true);

      // Knockout for the pi pcb
      translate(pi_pcb_pen_kn_pos)
        square(pi_pcb_kn, center = true);

      // Knockout for the pi components
      translate(pi_comp_pen_kn_pos)
        square(pi_comp_kn, center = true);

      // Slot for the pb tray
      translate(pb_pen_slot_pos)
        square(pb_pen_slot, center = true);

      // Knockout for the pb pcb
      translate(pb_pcb_pen_kn_pos)
        square(pb_pcb_kn, center = true);

      // Knockout for the pb components
      translate(pb_comp_pen_kn_pos)
        square(pb_comp_kn, center = true);

      // Knockout for the switch and wires
      translate([- 10, 0])
        circle(r = 8);
    }

  // Tray attachment points
  for (x = [4.2, 10], y = [- attach_pen_pos_y, attach_pen_pos_y]) {
    translate([x, y, bracket_ring_h + attach.z / 2])
      attachment();
  }
}

// Attachment point
module attachment() {
  difference() {
    cube(attach, center = true);

    // Hole fits an M2 screw
    rotate([0, 90, 0])
      cylinder(r = attach_hole_side_print_r, h = attach.x + 1, center = true);
  }
}
// main file
include <../part/pen_bracket.scad>

// Hi-def render
$fn = 60;

pen_bracket();
